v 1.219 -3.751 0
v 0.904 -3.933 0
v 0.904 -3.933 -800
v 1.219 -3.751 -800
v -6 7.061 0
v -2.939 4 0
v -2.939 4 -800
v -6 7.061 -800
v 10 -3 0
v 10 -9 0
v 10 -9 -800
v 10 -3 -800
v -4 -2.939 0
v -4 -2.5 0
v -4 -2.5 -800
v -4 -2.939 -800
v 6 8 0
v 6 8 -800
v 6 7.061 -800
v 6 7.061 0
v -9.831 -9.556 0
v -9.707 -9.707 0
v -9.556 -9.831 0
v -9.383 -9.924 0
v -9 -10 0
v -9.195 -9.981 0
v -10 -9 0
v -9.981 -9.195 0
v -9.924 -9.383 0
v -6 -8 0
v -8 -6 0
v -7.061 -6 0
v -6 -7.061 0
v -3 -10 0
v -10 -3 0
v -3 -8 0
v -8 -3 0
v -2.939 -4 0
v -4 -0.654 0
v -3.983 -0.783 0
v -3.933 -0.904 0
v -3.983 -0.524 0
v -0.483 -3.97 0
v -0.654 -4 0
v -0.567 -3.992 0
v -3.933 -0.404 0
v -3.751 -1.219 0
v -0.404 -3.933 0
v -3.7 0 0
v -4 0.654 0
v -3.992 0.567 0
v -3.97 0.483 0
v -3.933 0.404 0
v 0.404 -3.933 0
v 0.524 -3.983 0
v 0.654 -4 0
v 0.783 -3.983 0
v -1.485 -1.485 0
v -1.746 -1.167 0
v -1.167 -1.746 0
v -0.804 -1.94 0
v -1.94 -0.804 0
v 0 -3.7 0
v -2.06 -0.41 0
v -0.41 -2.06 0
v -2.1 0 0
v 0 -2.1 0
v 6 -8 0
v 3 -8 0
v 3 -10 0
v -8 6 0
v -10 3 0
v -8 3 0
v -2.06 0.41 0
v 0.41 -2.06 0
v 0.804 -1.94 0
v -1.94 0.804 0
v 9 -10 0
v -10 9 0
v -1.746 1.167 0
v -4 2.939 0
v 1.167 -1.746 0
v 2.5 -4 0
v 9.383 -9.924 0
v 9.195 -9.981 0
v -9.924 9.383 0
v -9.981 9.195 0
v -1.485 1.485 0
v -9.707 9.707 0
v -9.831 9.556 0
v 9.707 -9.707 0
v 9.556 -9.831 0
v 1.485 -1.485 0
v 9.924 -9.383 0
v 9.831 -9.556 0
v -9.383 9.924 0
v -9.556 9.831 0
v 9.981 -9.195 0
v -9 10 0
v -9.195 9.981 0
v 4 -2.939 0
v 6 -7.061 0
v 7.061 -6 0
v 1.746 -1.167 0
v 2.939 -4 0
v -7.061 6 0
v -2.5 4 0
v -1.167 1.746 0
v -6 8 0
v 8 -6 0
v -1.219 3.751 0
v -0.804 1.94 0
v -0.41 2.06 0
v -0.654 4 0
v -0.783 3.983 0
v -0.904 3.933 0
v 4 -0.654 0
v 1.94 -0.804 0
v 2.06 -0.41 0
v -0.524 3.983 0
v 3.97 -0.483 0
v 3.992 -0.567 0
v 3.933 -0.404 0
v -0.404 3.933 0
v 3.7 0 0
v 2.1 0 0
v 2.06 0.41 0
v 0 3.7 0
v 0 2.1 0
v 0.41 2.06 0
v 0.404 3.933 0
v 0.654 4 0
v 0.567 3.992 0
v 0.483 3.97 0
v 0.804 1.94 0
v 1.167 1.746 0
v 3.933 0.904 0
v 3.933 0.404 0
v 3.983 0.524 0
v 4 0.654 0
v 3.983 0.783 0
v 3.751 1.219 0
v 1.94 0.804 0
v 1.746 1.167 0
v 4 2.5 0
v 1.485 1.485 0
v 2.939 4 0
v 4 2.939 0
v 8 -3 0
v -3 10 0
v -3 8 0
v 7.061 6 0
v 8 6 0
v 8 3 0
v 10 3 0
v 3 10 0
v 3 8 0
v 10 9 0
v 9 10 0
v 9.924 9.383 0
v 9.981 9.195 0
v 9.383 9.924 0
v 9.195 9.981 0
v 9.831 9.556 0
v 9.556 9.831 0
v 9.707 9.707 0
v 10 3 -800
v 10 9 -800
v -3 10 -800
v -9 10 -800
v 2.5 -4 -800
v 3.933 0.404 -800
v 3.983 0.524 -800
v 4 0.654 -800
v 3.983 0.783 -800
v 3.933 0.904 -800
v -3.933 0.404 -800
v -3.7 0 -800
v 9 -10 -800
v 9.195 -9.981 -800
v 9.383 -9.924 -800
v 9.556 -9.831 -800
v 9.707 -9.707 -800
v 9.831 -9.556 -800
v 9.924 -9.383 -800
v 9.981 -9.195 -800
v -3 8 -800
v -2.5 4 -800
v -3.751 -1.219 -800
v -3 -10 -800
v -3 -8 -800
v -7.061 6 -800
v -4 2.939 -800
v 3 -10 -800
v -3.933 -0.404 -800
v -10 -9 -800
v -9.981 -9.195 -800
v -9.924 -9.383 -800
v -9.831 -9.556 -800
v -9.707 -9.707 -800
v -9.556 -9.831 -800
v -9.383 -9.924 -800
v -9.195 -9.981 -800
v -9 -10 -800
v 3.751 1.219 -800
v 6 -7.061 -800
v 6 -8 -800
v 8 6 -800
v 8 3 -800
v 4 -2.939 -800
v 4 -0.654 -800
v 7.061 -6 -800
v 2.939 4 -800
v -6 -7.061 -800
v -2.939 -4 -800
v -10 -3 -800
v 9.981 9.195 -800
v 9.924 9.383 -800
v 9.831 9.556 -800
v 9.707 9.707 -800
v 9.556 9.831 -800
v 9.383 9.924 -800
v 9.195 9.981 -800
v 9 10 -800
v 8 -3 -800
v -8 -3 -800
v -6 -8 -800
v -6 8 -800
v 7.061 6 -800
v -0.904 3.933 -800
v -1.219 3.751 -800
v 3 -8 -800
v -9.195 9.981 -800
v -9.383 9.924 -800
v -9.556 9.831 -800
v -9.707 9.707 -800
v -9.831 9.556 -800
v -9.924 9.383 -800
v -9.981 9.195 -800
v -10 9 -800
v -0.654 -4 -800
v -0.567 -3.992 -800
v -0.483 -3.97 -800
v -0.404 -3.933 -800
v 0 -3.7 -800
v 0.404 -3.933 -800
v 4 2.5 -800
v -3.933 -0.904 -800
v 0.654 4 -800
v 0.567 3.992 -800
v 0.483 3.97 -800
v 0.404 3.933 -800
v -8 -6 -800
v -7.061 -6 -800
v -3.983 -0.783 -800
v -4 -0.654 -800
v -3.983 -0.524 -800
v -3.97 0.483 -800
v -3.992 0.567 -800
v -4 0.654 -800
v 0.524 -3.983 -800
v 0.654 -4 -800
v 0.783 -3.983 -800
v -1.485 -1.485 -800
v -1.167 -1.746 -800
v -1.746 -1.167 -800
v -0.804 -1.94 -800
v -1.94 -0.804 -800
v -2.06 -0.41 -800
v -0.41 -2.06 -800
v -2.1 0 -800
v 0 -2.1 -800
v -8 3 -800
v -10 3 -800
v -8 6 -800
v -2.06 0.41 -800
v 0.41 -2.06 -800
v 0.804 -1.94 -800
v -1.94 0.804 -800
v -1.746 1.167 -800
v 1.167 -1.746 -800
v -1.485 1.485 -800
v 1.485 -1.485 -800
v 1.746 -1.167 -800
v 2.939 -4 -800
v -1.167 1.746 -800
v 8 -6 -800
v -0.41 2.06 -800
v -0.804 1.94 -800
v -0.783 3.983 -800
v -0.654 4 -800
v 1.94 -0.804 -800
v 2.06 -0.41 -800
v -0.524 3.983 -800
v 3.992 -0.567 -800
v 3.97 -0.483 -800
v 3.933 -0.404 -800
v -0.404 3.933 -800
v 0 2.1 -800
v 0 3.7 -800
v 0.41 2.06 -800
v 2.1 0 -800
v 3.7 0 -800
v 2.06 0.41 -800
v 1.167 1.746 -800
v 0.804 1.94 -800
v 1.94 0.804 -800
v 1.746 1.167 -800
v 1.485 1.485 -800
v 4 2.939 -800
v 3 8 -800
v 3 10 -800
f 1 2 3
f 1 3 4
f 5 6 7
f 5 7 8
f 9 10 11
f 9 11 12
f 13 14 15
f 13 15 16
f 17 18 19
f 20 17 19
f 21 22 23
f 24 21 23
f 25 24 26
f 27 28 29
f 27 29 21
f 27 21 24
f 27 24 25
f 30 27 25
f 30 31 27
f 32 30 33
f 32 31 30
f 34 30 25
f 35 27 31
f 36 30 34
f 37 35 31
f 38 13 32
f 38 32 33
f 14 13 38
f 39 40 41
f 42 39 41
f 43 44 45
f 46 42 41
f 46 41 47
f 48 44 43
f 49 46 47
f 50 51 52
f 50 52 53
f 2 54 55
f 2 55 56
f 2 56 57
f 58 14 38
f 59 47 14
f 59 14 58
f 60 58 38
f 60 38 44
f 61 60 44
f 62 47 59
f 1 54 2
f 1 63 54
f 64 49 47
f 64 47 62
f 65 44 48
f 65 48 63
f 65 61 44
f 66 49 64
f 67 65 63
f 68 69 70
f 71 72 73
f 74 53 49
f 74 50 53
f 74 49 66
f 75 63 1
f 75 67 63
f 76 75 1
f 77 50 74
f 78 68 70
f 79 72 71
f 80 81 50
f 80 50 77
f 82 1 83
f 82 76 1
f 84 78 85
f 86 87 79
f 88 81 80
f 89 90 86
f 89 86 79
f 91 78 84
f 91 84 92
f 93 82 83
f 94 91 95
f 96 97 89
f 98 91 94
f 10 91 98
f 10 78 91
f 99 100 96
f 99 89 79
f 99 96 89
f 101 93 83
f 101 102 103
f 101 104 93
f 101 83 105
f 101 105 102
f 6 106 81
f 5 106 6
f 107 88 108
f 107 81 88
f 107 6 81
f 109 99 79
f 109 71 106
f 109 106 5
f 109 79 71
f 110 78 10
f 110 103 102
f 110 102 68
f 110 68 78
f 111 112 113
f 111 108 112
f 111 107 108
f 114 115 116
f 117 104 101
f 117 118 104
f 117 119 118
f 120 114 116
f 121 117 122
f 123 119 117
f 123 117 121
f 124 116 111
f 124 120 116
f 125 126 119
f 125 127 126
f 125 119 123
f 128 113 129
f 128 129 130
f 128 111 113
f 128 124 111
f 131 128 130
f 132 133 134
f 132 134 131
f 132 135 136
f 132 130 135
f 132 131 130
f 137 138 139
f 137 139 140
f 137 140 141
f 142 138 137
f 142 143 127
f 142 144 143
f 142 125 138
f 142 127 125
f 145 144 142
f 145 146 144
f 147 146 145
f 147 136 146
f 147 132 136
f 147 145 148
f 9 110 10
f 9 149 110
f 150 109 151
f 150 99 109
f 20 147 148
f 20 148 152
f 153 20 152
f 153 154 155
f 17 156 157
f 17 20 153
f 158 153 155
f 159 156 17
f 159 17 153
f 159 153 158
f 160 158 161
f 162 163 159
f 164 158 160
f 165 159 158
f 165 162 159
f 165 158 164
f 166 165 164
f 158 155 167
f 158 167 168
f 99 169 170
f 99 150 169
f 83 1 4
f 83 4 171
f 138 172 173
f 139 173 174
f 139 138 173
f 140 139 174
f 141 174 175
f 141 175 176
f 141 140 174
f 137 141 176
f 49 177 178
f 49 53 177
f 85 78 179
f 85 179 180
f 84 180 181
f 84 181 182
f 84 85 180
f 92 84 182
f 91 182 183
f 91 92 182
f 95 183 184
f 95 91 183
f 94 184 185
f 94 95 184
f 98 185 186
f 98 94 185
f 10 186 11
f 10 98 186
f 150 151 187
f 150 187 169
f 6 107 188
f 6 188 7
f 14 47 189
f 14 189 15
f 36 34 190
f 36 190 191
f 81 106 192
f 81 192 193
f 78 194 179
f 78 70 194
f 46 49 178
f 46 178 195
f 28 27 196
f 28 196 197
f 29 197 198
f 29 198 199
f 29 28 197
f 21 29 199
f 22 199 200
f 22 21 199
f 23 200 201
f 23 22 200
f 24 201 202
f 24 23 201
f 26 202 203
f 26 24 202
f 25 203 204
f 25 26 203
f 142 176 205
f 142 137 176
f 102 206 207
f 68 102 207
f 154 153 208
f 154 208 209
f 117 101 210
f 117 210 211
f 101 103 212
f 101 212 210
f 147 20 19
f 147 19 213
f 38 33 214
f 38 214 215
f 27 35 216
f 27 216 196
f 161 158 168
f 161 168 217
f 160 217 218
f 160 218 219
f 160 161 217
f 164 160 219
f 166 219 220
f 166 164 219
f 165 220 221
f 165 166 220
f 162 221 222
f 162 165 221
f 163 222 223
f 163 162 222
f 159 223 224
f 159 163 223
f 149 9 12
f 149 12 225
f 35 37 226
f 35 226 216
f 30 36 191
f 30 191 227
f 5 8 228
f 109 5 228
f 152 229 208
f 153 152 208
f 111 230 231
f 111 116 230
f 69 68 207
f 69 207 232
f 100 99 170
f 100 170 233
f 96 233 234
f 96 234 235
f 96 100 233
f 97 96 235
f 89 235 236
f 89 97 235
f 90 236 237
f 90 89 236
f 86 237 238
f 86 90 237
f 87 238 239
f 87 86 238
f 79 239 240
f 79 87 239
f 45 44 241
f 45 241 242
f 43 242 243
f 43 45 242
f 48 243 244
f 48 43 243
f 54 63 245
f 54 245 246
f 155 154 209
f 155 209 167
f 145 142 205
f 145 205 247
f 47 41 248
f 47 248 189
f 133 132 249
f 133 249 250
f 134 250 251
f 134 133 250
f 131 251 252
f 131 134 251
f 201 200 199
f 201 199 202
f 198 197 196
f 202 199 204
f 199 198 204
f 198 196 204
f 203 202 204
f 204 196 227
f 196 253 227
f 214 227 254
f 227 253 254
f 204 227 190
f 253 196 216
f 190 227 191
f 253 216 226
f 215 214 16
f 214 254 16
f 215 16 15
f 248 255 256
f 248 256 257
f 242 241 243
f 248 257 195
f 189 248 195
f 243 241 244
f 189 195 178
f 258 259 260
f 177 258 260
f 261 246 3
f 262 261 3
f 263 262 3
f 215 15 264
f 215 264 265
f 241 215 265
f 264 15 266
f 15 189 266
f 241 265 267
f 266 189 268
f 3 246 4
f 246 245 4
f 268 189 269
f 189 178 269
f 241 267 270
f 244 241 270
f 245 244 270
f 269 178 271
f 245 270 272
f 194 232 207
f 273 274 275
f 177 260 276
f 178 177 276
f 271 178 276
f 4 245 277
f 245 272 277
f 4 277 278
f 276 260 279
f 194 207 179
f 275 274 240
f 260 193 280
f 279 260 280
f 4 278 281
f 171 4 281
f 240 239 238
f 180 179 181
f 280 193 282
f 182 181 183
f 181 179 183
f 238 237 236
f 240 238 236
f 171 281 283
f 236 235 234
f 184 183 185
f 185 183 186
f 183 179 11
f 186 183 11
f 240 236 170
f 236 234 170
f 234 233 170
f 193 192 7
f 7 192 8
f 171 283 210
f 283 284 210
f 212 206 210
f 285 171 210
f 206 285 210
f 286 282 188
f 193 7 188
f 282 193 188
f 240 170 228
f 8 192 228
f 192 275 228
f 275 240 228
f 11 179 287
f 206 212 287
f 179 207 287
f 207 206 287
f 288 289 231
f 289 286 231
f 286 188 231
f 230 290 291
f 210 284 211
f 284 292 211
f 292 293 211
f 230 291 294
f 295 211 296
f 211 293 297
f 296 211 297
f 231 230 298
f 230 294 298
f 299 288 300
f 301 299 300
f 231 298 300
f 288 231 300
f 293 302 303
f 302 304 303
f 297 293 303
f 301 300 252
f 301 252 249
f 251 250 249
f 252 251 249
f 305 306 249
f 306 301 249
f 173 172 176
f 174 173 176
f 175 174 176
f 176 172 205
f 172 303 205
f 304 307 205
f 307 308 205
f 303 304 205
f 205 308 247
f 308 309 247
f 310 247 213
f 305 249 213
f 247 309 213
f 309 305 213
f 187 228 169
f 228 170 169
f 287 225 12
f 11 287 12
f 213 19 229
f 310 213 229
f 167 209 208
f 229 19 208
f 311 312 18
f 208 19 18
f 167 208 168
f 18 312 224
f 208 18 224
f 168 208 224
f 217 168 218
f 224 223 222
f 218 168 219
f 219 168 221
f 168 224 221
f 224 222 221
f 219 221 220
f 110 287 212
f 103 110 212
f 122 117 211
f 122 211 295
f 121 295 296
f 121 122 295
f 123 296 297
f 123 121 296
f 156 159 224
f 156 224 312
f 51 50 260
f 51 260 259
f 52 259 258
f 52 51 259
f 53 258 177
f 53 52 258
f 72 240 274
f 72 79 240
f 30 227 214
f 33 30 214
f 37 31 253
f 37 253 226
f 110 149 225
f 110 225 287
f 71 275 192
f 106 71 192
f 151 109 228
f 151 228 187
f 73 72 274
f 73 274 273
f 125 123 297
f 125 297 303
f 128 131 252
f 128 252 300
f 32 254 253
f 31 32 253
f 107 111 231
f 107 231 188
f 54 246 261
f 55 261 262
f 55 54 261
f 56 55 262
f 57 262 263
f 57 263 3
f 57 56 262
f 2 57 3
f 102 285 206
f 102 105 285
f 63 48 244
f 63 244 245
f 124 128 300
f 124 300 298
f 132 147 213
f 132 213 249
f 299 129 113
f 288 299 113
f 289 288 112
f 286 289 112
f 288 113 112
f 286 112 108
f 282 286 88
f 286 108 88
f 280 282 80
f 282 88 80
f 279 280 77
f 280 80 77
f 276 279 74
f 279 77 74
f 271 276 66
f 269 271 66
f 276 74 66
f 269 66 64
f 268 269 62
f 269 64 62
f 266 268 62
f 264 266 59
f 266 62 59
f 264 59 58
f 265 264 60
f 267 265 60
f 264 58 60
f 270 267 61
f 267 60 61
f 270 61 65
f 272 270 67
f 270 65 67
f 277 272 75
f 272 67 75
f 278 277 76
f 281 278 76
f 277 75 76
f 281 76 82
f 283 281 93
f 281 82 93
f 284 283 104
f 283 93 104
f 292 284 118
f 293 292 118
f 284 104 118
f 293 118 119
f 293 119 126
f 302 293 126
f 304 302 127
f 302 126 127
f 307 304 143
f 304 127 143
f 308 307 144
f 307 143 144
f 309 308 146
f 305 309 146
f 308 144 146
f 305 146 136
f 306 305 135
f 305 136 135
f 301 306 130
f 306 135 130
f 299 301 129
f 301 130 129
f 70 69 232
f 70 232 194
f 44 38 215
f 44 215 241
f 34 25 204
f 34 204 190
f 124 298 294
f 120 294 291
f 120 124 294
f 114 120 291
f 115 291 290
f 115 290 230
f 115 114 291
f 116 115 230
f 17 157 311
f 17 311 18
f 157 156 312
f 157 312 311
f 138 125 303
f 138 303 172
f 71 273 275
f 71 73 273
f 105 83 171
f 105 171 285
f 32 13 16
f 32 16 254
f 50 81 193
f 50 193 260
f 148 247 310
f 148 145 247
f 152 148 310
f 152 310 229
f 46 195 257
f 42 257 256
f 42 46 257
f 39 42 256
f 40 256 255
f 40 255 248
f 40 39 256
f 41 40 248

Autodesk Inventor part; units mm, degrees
ref_plane "YZ Plane" through (0, 0, 0) normal (1, 0, 0) x (0, 1, 0)
ref_plane "XZ Plane" through (0, 0, 0) normal (0, 1, 0) x (-1, 0, 0)
ref_plane "XY Plane" through (0, 0, 0) normal (0, 0, 1) x (1, 0, 0)
sketch "_____4" plane through (0, 0, 0) normal (0, 0, 1) x (1, 0, 0)
  line L0 (-10, -3) -> (-10, -9)
  arc A0 (-10, -9) -> (-9, -10) centre (-9, -9) ccw
  line L1 (-9, -10) -> (-3, -10)
  line L2 (-3, -10) -> (-3, -8)
  line L3 (-3, -8) -> (-6, -8)
  line L4 (-6, -8) -> (-6, -7.0607)
  line L5 (-6, -7.0607) -> (-2.9393, -4)
  line L6 (-2.9393, -4) -> (-0.6536, -4)
  arc A1 (-0.6536, -4) -> (-0.4036, -3.933) centre (-0.6536, -3.5) ccw
  line L7 (-0.4036, -3.933) -> (0, -3.7)
  line L8 (0, -3.7) -> (0.4036, -3.933)
  arc A2 (0.4036, -3.933) -> (0.9036, -3.933) centre (0.6536, -3.5) ccw
  line L9 (0.9036, -3.933) -> (1.2189, -3.751)
  line L10 (1.2189, -3.751) -> (2.5, -4)
  line L11 (2.5, -4) -> (2.9393, -4)
  line L12 (2.9393, -4) -> (6, -7.0607)
  line L13 (6, -7.0607) -> (6, -8)
  line L14 (6, -8) -> (3, -8)
  line L15 (3, -8) -> (3, -10)
  line L16 (3, -10) -> (9, -10)
  arc A3 (9, -10) -> (10, -9) centre (9, -9) ccw
  line L17 (10, -9) -> (10, -3)
  line L18 (10, -3) -> (8, -3)
  line L19 (8, -3) -> (8, -6)
  line L20 (8, -6) -> (7.0607, -6)
  line L21 (7.0607, -6) -> (4, -2.9393)
  line L22 (4, -2.9393) -> (4, -0.6536)
  arc A4 (4, -0.6536) -> (3.933, -0.4036) centre (3.5, -0.6536) ccw
  line L23 (3.933, -0.4036) -> (3.7, 0)
  line L24 (3.7, 0) -> (3.933, 0.4036)
  arc A5 (3.933, 0.4036) -> (3.933, 0.9036) centre (3.5, 0.6536) ccw
  line L25 (3.933, 0.9036) -> (3.751, 1.2189)
  line L26 (3.751, 1.2189) -> (4, 2.5)
  line L27 (4, 2.5) -> (4, 2.9393)
  line L28 (4, 2.9393) -> (7.0607, 6)
  line L29 (7.0607, 6) -> (8, 6)
  line L30 (8, 6) -> (8, 3)
  line L31 (8, 3) -> (10, 3)
  line L32 (10, 3) -> (10, 9)
  arc A6 (10, 9) -> (9, 10) centre (9, 9) ccw
  line L33 (9, 10) -> (3, 10)
  line L34 (3, 10) -> (3, 8)
  line L35 (3, 8) -> (6, 8)
  line L36 (6, 8) -> (6, 7.0607)
  line L37 (6, 7.0607) -> (2.9393, 4)
  line L38 (2.9393, 4) -> (0.6536, 4)
  arc A7 (0.6536, 4) -> (0.4036, 3.933) centre (0.6536, 3.5) ccw
  line L39 (0.4036, 3.933) -> (0, 3.7)
  line L40 (0, 3.7) -> (-0.4036, 3.933)
  arc A8 (-0.4036, 3.933) -> (-0.9036, 3.933) centre (-0.6536, 3.5) ccw
  line L41 (-0.9036, 3.933) -> (-1.2189, 3.751)
  line L42 (-1.2189, 3.751) -> (-2.5, 4)
  line L43 (-2.5, 4) -> (-2.9393, 4)
  line L44 (-2.9393, 4) -> (-6, 7.0607)
  line L45 (-6, 7.0607) -> (-6, 8)
  line L46 (-6, 8) -> (-3, 8)
  line L47 (-3, 8) -> (-3, 10)
  line L48 (-3, 10) -> (-9, 10)
  arc A9 (-9, 10) -> (-10, 9) centre (-9, 9) ccw
  line L49 (-10, 9) -> (-10, 3)
  line L50 (-10, 3) -> (-8, 3)
  line L51 (-8, 3) -> (-8, 6)
  line L52 (-8, 6) -> (-7.0607, 6)
  line L53 (-7.0607, 6) -> (-4, 2.9393)
  line L54 (-4, 2.9393) -> (-4, 0.6536)
  arc A10 (-4, 0.6536) -> (-3.933, 0.4036) centre (-3.5, 0.6536) ccw
  line L55 (-3.933, 0.4036) -> (-3.7, 0)
  line L56 (-3.7, 0) -> (-3.933, -0.4036)
  arc A11 (-3.933, -0.4036) -> (-3.933, -0.9036) centre (-3.5, -0.6536) ccw
  line L57 (-3.933, -0.9036) -> (-3.751, -1.2189)
  line L58 (-3.751, -1.2189) -> (-4, -2.5)
  line L59 (-4, -2.5) -> (-4, -2.9393)
  line L60 (-4, -2.9393) -> (-7.0607, -6)
  line L61 (-7.0607, -6) -> (-8, -6)
  line L62 (-8, -6) -> (-8, -3)
  line L63 (-8, -3) -> (-10, -3)
extrude "Extrusion1" add sketch "_____4" against normal blind 800
sketch "Sketch2" plane through (0, 0, -800) normal (0, 0, -1) x (-1, 0, 0)
  point P0 (0, 0)
hole "Hole1" at (0, 0, -800) direction (0, 0, 1) diameter 4.2 depth 4000
properties part number "KNFS5-2020" material "アルミニウム 6061"
